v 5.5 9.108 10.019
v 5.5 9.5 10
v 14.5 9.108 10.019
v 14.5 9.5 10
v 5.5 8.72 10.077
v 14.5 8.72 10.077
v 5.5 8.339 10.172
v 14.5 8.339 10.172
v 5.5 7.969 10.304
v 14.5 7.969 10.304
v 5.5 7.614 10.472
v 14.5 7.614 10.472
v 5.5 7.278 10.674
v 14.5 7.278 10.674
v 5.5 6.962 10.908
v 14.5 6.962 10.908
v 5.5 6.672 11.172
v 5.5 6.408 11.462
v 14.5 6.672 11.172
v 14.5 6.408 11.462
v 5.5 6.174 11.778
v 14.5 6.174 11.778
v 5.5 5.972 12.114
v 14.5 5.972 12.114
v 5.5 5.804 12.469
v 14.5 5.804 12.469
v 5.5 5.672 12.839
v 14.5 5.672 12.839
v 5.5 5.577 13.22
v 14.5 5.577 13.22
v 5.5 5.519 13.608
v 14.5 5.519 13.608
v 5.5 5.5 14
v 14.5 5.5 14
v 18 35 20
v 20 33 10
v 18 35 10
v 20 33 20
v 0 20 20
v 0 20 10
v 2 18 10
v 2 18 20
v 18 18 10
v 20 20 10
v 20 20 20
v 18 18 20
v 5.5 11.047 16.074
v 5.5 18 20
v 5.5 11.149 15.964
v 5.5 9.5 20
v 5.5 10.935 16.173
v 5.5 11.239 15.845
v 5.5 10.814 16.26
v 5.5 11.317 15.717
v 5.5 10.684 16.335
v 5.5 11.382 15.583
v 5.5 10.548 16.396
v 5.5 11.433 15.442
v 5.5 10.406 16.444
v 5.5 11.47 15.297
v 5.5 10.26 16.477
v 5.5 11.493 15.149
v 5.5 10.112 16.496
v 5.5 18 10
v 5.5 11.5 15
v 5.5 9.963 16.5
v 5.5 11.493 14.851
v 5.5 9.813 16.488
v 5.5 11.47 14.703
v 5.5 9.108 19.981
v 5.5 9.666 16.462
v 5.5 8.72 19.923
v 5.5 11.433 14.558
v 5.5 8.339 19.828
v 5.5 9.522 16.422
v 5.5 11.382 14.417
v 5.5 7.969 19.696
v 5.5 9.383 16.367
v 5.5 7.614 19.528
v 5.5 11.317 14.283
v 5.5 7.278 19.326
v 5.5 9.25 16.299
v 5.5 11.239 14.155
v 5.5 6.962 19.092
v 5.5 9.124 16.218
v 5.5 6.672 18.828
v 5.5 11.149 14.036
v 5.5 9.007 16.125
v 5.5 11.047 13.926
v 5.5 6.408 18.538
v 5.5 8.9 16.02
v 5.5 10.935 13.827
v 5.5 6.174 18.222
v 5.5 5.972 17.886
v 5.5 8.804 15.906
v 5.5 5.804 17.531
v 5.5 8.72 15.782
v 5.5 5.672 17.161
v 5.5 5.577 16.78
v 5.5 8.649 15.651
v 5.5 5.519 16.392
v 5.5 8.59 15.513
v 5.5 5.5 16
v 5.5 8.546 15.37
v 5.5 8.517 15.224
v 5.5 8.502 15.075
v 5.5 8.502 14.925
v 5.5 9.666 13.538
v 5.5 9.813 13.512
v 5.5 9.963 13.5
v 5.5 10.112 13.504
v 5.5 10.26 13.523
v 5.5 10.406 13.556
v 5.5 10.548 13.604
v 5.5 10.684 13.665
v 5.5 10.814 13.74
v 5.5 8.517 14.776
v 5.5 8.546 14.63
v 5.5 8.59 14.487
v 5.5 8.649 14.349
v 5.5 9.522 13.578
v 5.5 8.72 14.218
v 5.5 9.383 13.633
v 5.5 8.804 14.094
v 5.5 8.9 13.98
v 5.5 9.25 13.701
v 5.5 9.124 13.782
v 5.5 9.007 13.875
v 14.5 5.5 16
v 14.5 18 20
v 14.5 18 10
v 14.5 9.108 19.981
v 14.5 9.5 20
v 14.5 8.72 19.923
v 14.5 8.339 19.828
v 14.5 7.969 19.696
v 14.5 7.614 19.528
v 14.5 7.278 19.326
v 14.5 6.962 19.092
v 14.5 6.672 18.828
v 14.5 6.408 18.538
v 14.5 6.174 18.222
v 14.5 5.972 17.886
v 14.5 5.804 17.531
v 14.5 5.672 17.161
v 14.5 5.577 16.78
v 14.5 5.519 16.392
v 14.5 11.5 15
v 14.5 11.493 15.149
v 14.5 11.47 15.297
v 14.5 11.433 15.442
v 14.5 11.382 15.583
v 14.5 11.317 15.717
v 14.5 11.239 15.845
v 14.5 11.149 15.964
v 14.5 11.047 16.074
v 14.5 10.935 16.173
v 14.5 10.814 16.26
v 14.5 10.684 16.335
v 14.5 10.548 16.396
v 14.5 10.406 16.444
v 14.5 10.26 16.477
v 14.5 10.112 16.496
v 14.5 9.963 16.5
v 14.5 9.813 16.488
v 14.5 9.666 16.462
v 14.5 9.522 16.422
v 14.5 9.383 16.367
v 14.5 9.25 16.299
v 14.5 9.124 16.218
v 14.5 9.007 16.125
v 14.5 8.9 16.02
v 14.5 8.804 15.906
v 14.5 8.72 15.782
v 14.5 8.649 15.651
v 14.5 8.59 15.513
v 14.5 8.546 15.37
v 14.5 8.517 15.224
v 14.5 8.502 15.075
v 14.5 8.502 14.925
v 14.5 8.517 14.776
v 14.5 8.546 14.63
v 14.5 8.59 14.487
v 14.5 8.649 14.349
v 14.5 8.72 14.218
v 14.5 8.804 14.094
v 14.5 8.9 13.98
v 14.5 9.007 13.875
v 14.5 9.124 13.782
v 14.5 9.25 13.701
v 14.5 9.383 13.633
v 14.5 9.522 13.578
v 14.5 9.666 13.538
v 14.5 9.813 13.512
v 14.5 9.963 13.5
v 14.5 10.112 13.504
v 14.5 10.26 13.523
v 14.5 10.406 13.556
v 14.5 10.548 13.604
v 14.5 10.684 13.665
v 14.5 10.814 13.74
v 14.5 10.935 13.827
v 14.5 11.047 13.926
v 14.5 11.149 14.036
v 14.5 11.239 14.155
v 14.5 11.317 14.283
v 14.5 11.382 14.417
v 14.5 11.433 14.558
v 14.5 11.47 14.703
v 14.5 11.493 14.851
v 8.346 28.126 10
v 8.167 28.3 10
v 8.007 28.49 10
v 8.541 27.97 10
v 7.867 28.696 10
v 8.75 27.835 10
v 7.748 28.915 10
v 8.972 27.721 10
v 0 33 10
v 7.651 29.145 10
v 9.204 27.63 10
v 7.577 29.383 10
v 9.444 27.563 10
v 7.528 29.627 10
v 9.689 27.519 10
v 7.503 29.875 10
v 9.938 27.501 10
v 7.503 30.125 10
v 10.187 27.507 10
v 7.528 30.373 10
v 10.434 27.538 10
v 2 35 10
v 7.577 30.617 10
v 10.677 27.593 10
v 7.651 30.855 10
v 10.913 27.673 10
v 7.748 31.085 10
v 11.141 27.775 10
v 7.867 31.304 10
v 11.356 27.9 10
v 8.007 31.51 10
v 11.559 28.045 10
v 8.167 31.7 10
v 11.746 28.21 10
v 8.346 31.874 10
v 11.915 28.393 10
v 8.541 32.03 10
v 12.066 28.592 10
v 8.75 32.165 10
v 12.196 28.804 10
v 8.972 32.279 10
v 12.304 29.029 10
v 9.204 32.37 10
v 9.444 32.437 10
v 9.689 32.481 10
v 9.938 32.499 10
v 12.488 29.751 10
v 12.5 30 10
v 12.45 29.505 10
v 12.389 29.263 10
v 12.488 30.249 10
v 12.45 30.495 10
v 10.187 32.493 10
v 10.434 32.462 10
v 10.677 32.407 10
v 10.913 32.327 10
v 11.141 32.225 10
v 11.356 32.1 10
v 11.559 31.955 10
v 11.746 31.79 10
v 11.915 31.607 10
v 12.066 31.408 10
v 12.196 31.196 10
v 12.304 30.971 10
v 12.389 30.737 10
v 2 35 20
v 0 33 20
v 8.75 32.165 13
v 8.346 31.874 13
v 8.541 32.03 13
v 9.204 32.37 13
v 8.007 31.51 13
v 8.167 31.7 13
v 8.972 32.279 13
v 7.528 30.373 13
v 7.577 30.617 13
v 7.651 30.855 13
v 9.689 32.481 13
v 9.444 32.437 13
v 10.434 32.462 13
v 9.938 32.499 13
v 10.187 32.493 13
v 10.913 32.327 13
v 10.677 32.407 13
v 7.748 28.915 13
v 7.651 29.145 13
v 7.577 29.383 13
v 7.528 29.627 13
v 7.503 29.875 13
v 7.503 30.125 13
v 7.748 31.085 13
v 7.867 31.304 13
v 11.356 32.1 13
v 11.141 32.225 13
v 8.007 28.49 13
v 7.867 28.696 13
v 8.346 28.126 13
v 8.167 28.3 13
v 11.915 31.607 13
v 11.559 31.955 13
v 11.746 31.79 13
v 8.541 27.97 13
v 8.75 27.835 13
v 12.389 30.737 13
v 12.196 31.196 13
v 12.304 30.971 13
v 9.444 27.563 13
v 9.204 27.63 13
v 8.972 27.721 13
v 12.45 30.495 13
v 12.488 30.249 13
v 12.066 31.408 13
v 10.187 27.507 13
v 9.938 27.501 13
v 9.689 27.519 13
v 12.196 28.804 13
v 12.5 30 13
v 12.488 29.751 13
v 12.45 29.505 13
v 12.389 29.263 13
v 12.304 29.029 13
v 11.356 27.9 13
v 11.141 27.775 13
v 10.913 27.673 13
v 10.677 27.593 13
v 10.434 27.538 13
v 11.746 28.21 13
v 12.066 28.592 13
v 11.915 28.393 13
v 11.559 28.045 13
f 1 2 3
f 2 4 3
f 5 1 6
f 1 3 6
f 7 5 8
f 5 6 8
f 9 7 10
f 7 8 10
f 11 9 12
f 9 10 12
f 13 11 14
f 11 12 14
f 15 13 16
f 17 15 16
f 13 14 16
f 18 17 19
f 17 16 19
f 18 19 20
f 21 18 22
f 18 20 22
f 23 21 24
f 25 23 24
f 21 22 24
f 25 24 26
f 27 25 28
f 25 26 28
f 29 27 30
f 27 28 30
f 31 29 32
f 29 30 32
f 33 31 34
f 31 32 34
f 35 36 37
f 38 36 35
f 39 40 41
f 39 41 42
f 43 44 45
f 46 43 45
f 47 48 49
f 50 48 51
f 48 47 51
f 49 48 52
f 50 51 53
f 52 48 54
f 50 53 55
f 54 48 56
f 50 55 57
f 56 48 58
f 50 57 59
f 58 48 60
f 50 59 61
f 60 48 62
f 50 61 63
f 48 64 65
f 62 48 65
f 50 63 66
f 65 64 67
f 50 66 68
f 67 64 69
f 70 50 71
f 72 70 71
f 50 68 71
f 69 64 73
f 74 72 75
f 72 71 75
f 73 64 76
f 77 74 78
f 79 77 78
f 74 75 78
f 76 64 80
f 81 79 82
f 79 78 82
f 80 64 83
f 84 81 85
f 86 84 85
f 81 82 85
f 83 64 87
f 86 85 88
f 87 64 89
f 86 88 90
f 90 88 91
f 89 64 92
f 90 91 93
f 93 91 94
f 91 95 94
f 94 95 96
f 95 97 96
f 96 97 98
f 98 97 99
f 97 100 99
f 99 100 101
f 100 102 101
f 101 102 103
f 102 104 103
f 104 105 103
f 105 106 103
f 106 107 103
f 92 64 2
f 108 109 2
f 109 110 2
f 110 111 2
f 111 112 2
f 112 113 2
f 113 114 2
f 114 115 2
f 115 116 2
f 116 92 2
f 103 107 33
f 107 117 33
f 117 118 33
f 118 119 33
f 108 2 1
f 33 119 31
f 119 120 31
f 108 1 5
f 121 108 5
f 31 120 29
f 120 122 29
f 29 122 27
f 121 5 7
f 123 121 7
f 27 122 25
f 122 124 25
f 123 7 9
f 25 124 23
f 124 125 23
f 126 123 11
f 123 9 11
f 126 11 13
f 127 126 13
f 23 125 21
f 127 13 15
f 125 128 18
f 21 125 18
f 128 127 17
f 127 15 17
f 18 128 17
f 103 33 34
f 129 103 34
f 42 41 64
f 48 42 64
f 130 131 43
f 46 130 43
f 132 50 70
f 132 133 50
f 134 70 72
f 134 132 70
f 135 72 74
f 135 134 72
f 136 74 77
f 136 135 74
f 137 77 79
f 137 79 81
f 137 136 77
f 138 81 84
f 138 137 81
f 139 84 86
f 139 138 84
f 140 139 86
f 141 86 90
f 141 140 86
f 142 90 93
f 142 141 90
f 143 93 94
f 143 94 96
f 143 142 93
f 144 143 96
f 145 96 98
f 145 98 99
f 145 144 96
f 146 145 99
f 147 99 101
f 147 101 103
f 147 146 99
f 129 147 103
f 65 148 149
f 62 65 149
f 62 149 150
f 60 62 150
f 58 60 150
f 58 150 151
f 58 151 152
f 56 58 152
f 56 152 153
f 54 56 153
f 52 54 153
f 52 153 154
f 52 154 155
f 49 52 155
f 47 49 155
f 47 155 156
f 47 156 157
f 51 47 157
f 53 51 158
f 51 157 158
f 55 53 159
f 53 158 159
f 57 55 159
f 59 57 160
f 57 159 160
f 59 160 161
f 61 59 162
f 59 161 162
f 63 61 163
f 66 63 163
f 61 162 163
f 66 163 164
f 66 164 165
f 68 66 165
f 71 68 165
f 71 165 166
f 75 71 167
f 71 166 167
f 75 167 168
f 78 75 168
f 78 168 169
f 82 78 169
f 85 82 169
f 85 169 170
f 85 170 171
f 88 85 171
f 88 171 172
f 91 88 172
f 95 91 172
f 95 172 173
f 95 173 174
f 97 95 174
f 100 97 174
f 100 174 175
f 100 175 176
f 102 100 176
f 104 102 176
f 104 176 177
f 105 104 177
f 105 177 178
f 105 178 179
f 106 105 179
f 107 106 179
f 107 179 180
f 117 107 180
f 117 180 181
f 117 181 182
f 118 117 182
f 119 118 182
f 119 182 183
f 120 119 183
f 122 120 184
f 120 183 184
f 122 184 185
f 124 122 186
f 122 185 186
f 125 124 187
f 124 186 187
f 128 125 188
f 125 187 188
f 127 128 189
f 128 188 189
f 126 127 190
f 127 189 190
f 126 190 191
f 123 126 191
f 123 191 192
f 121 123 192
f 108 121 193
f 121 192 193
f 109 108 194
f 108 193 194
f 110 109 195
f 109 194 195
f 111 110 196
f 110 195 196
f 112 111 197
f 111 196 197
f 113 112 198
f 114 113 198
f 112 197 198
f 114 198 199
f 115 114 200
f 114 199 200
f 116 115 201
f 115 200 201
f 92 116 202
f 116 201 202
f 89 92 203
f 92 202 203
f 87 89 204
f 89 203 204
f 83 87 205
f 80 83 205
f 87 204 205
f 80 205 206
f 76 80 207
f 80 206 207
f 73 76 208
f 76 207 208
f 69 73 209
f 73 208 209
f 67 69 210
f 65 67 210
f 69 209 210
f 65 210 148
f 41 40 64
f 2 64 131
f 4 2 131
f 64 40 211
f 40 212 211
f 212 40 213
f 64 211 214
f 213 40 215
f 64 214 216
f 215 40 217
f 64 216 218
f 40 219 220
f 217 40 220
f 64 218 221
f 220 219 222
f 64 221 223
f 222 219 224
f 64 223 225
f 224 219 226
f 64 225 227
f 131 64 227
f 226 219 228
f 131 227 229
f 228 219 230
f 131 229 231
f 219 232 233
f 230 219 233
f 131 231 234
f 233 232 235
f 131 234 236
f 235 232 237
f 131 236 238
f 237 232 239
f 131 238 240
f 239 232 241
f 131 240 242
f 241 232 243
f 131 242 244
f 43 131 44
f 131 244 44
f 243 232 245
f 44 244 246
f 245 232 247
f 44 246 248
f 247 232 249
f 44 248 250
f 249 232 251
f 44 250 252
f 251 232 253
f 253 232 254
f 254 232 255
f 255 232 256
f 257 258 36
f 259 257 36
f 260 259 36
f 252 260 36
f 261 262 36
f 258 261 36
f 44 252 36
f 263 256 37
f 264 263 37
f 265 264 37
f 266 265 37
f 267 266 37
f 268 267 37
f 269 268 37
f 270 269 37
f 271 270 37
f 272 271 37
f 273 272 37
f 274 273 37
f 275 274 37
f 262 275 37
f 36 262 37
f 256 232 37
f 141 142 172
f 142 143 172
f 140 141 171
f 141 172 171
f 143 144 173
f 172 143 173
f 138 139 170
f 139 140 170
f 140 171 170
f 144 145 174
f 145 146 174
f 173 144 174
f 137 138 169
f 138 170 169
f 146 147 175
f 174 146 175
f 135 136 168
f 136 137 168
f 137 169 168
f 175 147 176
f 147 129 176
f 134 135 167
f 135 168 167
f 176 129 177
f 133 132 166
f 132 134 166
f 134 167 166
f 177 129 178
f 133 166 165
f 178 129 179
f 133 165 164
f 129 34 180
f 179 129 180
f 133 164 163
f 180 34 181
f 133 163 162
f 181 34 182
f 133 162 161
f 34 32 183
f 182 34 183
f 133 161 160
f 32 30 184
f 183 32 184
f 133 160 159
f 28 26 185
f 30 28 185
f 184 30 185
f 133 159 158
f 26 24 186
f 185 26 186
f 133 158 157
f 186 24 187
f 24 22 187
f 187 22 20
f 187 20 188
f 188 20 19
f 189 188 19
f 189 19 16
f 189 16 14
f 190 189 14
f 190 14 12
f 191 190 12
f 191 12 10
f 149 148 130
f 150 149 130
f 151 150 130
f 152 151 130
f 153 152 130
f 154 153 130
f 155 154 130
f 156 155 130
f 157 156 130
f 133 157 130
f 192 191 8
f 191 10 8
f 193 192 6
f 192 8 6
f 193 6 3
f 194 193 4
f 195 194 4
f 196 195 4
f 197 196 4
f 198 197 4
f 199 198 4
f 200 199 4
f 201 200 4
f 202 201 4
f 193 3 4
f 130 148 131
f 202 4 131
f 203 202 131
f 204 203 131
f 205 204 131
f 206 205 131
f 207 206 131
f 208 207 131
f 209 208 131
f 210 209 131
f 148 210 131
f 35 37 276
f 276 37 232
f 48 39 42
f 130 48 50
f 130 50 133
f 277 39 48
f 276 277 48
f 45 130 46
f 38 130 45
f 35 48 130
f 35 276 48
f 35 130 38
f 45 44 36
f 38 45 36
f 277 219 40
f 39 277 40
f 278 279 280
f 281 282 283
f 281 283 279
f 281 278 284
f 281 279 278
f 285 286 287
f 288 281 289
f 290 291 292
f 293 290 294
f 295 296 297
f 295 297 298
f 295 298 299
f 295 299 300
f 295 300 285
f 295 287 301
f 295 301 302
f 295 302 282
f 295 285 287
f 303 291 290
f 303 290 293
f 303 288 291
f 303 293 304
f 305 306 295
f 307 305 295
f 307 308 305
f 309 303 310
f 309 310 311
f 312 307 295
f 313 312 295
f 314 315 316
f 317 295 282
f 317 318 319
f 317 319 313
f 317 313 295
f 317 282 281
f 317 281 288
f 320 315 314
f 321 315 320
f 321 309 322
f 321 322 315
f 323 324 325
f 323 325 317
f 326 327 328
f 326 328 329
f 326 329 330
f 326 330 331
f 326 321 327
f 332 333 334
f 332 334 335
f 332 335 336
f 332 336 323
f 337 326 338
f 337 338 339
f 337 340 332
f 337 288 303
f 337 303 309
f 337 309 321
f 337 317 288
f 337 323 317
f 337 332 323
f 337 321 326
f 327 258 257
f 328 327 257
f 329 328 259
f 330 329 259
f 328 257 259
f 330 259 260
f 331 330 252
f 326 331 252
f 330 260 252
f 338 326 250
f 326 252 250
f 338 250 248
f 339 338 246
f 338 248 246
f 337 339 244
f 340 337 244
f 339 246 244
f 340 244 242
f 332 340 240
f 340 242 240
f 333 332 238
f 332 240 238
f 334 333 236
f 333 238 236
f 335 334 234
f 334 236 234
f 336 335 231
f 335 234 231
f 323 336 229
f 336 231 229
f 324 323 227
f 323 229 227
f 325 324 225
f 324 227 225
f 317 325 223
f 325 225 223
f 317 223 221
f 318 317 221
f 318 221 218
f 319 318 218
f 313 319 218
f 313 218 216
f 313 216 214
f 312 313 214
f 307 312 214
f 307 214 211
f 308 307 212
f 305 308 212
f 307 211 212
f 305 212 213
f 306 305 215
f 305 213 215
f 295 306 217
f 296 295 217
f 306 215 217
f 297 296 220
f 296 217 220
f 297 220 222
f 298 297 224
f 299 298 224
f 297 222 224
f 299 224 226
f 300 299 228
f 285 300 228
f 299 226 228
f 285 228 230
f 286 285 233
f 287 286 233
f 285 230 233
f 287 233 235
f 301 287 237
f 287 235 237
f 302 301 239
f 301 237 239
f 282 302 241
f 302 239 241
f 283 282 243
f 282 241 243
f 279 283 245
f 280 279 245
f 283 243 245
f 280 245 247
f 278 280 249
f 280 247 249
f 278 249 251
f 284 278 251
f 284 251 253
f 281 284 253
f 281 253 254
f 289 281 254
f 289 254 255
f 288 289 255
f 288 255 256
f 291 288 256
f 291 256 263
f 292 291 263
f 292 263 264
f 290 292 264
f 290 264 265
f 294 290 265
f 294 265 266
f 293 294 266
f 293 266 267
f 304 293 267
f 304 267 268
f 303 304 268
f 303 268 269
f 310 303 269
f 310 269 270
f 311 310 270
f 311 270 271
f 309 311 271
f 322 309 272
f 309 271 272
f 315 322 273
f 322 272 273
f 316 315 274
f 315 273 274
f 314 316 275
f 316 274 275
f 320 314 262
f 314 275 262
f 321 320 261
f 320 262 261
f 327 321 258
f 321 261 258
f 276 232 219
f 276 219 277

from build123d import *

# Parameters (mm, degrees)
PAD001_DEPTH    = 10
SKETCH004_R     = 1.5
POCKET002_DEPTH = 14.501
SKETCH005_R     = 2.5
POCKET003_DEPTH = 3
FILLET_R        = 4
CHAMFER001_SIZE = 2


with BuildPart() as part:
    # Sketch003 → Pad001 (new body)
    with BuildSketch(Plane.XY):
        Polygon((0, 18), (5.5, 18), (5.5, 5.5), (14.5, 5.5), (14.5, 18), (20, 18), (20, 35), (0, 35), align=None)
    extrude(amount=PAD001_DEPTH)

    # Sketch004 (on Face4 of Pad001) → Pocket002 (cut, through all)
    with BuildSketch(Plane.YZ.offset(14.5)):
        with Locations((10, 5)):
            Circle(SKETCH004_R)
    extrude(amount=-POCKET002_DEPTH, mode=Mode.SUBTRACT)

    # Sketch005 (on Face4 of Pocket002) → Pocket003 (cut)
    with BuildSketch(Plane(origin=(0, 0, 0), x_dir=(1, 0, 0), z_dir=(0, 0, -1))):
        with Locations((10, -30)):
            Circle(SKETCH005_R)
    extrude(amount=-POCKET003_DEPTH, mode=Mode.SUBTRACT)

    # Fillet
    fillet_edges = [part.edges().sort_by_distance(p)[0] for p in [
        (10, 5.5, 10),
        (10, 5.5, 0),
    ]]
    fillet(fillet_edges, radius=FILLET_R)

    # Chamfer001
    chamfer001_edges = [part.edges().sort_by_distance(p)[0] for p in [
        (0, 35, 5),
        (0, 18, 5),
        (20, 35, 5),
        (20, 18, 5),
    ]]
    chamfer(chamfer001_edges, length=CHAMFER001_SIZE)


with BuildPart() as part_1:
    # Body001 placement: moved
    add(part.part.moved(Location((0, 0, 10))))


solid = part_1.part
